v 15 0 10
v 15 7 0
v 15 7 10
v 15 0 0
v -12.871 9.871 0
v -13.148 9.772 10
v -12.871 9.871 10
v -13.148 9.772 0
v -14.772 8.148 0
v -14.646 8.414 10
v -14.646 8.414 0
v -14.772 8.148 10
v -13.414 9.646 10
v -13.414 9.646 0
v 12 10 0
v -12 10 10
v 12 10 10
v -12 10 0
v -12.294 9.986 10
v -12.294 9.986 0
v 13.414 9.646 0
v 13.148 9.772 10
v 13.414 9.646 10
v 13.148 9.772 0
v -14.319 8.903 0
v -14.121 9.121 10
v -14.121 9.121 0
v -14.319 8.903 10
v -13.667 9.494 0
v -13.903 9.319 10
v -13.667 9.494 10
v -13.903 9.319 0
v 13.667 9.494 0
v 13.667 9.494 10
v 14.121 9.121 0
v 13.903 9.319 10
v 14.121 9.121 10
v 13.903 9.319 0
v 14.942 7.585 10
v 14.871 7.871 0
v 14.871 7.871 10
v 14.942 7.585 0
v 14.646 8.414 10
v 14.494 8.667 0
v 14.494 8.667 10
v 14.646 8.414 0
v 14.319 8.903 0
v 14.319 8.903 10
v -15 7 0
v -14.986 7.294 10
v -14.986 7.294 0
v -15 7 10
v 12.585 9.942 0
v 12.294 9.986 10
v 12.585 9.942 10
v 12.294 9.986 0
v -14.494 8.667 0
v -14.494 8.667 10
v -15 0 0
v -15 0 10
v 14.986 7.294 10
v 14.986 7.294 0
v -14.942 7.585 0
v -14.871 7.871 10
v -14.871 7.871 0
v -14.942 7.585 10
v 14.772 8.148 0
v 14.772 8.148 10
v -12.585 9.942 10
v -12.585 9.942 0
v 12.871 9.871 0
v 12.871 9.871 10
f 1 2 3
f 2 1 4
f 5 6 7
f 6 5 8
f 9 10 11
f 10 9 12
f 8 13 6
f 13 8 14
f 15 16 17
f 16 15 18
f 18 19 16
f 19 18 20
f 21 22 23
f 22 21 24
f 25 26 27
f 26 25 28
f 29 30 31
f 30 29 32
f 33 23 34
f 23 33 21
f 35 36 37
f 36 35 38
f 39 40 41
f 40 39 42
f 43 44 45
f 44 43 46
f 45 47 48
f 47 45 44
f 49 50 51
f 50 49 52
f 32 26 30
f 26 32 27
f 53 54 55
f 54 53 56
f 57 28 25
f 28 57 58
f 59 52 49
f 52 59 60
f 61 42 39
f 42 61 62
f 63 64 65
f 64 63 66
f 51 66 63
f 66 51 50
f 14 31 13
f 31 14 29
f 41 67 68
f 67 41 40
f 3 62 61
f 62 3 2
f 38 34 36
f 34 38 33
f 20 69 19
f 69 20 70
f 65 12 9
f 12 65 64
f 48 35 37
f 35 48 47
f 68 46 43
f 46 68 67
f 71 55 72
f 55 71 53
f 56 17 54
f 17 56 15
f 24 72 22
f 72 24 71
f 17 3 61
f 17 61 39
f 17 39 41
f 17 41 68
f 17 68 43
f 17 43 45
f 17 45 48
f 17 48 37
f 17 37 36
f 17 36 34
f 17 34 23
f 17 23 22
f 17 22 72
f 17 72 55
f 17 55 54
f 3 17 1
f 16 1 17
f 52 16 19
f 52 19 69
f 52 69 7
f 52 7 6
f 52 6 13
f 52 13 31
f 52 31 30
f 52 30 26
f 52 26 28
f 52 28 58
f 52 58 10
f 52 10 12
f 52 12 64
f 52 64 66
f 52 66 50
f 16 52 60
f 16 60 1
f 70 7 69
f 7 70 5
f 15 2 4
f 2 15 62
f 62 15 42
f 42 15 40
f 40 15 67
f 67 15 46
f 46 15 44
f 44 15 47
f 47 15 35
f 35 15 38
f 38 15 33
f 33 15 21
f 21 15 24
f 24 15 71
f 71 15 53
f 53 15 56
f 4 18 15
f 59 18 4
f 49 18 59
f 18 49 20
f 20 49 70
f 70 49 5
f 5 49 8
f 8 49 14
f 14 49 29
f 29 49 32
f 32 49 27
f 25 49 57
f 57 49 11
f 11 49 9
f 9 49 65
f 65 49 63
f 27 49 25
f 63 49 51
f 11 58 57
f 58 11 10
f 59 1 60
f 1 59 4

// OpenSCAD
// file: rounded_box.scad
/**
 * rounded_box.scad
 *
 * Create a rounded box with rounded corners.
 *
 * @param size [x, y, z] - The size of the box.
 * @param radius - The radius of the corners.
 * @param center - Center the box at the origin.
 * @param fn - The number of facets to use for the cylinder.
 *
 * @return {object} - A rounded box with rounded corners.
 */
module rounded_box(size = [10, 10, 10], radius = 2, center = false, fn = 64) {
    hull() {
        for (x = [-1, 1], y = [-1, 1]) {
            translate([x * (size[0] / 2 - radius), y * (size[1] / 2 - radius), 0])
                cylinder(h=size[2], r=radius, center=center, $fn=fn);
        }
    }
}

// Example Usage
rounded_box([30, 20, 10], radius=3);
// main file
/**
 * Module to show a cross section of the object.
 *
 * @param {boolean} showXSection - Show the cross section.
 * @param {number} size - Size of the cross section.
 * @param {string} color - Color of the cross section.
 */

module cross_section(showXSection = false, size = 100, color = "Red") {
    if (showXSection) {
        difference() {
            children();

            translate([-size / 2, -size, -size / 2]) color(color) cube([size, size, size]);
        }
    } else {
        children();
    }
}

use <rounded_box.scad>;

cross_section(true) rounded_box([30, 20, 10], radius=3);
